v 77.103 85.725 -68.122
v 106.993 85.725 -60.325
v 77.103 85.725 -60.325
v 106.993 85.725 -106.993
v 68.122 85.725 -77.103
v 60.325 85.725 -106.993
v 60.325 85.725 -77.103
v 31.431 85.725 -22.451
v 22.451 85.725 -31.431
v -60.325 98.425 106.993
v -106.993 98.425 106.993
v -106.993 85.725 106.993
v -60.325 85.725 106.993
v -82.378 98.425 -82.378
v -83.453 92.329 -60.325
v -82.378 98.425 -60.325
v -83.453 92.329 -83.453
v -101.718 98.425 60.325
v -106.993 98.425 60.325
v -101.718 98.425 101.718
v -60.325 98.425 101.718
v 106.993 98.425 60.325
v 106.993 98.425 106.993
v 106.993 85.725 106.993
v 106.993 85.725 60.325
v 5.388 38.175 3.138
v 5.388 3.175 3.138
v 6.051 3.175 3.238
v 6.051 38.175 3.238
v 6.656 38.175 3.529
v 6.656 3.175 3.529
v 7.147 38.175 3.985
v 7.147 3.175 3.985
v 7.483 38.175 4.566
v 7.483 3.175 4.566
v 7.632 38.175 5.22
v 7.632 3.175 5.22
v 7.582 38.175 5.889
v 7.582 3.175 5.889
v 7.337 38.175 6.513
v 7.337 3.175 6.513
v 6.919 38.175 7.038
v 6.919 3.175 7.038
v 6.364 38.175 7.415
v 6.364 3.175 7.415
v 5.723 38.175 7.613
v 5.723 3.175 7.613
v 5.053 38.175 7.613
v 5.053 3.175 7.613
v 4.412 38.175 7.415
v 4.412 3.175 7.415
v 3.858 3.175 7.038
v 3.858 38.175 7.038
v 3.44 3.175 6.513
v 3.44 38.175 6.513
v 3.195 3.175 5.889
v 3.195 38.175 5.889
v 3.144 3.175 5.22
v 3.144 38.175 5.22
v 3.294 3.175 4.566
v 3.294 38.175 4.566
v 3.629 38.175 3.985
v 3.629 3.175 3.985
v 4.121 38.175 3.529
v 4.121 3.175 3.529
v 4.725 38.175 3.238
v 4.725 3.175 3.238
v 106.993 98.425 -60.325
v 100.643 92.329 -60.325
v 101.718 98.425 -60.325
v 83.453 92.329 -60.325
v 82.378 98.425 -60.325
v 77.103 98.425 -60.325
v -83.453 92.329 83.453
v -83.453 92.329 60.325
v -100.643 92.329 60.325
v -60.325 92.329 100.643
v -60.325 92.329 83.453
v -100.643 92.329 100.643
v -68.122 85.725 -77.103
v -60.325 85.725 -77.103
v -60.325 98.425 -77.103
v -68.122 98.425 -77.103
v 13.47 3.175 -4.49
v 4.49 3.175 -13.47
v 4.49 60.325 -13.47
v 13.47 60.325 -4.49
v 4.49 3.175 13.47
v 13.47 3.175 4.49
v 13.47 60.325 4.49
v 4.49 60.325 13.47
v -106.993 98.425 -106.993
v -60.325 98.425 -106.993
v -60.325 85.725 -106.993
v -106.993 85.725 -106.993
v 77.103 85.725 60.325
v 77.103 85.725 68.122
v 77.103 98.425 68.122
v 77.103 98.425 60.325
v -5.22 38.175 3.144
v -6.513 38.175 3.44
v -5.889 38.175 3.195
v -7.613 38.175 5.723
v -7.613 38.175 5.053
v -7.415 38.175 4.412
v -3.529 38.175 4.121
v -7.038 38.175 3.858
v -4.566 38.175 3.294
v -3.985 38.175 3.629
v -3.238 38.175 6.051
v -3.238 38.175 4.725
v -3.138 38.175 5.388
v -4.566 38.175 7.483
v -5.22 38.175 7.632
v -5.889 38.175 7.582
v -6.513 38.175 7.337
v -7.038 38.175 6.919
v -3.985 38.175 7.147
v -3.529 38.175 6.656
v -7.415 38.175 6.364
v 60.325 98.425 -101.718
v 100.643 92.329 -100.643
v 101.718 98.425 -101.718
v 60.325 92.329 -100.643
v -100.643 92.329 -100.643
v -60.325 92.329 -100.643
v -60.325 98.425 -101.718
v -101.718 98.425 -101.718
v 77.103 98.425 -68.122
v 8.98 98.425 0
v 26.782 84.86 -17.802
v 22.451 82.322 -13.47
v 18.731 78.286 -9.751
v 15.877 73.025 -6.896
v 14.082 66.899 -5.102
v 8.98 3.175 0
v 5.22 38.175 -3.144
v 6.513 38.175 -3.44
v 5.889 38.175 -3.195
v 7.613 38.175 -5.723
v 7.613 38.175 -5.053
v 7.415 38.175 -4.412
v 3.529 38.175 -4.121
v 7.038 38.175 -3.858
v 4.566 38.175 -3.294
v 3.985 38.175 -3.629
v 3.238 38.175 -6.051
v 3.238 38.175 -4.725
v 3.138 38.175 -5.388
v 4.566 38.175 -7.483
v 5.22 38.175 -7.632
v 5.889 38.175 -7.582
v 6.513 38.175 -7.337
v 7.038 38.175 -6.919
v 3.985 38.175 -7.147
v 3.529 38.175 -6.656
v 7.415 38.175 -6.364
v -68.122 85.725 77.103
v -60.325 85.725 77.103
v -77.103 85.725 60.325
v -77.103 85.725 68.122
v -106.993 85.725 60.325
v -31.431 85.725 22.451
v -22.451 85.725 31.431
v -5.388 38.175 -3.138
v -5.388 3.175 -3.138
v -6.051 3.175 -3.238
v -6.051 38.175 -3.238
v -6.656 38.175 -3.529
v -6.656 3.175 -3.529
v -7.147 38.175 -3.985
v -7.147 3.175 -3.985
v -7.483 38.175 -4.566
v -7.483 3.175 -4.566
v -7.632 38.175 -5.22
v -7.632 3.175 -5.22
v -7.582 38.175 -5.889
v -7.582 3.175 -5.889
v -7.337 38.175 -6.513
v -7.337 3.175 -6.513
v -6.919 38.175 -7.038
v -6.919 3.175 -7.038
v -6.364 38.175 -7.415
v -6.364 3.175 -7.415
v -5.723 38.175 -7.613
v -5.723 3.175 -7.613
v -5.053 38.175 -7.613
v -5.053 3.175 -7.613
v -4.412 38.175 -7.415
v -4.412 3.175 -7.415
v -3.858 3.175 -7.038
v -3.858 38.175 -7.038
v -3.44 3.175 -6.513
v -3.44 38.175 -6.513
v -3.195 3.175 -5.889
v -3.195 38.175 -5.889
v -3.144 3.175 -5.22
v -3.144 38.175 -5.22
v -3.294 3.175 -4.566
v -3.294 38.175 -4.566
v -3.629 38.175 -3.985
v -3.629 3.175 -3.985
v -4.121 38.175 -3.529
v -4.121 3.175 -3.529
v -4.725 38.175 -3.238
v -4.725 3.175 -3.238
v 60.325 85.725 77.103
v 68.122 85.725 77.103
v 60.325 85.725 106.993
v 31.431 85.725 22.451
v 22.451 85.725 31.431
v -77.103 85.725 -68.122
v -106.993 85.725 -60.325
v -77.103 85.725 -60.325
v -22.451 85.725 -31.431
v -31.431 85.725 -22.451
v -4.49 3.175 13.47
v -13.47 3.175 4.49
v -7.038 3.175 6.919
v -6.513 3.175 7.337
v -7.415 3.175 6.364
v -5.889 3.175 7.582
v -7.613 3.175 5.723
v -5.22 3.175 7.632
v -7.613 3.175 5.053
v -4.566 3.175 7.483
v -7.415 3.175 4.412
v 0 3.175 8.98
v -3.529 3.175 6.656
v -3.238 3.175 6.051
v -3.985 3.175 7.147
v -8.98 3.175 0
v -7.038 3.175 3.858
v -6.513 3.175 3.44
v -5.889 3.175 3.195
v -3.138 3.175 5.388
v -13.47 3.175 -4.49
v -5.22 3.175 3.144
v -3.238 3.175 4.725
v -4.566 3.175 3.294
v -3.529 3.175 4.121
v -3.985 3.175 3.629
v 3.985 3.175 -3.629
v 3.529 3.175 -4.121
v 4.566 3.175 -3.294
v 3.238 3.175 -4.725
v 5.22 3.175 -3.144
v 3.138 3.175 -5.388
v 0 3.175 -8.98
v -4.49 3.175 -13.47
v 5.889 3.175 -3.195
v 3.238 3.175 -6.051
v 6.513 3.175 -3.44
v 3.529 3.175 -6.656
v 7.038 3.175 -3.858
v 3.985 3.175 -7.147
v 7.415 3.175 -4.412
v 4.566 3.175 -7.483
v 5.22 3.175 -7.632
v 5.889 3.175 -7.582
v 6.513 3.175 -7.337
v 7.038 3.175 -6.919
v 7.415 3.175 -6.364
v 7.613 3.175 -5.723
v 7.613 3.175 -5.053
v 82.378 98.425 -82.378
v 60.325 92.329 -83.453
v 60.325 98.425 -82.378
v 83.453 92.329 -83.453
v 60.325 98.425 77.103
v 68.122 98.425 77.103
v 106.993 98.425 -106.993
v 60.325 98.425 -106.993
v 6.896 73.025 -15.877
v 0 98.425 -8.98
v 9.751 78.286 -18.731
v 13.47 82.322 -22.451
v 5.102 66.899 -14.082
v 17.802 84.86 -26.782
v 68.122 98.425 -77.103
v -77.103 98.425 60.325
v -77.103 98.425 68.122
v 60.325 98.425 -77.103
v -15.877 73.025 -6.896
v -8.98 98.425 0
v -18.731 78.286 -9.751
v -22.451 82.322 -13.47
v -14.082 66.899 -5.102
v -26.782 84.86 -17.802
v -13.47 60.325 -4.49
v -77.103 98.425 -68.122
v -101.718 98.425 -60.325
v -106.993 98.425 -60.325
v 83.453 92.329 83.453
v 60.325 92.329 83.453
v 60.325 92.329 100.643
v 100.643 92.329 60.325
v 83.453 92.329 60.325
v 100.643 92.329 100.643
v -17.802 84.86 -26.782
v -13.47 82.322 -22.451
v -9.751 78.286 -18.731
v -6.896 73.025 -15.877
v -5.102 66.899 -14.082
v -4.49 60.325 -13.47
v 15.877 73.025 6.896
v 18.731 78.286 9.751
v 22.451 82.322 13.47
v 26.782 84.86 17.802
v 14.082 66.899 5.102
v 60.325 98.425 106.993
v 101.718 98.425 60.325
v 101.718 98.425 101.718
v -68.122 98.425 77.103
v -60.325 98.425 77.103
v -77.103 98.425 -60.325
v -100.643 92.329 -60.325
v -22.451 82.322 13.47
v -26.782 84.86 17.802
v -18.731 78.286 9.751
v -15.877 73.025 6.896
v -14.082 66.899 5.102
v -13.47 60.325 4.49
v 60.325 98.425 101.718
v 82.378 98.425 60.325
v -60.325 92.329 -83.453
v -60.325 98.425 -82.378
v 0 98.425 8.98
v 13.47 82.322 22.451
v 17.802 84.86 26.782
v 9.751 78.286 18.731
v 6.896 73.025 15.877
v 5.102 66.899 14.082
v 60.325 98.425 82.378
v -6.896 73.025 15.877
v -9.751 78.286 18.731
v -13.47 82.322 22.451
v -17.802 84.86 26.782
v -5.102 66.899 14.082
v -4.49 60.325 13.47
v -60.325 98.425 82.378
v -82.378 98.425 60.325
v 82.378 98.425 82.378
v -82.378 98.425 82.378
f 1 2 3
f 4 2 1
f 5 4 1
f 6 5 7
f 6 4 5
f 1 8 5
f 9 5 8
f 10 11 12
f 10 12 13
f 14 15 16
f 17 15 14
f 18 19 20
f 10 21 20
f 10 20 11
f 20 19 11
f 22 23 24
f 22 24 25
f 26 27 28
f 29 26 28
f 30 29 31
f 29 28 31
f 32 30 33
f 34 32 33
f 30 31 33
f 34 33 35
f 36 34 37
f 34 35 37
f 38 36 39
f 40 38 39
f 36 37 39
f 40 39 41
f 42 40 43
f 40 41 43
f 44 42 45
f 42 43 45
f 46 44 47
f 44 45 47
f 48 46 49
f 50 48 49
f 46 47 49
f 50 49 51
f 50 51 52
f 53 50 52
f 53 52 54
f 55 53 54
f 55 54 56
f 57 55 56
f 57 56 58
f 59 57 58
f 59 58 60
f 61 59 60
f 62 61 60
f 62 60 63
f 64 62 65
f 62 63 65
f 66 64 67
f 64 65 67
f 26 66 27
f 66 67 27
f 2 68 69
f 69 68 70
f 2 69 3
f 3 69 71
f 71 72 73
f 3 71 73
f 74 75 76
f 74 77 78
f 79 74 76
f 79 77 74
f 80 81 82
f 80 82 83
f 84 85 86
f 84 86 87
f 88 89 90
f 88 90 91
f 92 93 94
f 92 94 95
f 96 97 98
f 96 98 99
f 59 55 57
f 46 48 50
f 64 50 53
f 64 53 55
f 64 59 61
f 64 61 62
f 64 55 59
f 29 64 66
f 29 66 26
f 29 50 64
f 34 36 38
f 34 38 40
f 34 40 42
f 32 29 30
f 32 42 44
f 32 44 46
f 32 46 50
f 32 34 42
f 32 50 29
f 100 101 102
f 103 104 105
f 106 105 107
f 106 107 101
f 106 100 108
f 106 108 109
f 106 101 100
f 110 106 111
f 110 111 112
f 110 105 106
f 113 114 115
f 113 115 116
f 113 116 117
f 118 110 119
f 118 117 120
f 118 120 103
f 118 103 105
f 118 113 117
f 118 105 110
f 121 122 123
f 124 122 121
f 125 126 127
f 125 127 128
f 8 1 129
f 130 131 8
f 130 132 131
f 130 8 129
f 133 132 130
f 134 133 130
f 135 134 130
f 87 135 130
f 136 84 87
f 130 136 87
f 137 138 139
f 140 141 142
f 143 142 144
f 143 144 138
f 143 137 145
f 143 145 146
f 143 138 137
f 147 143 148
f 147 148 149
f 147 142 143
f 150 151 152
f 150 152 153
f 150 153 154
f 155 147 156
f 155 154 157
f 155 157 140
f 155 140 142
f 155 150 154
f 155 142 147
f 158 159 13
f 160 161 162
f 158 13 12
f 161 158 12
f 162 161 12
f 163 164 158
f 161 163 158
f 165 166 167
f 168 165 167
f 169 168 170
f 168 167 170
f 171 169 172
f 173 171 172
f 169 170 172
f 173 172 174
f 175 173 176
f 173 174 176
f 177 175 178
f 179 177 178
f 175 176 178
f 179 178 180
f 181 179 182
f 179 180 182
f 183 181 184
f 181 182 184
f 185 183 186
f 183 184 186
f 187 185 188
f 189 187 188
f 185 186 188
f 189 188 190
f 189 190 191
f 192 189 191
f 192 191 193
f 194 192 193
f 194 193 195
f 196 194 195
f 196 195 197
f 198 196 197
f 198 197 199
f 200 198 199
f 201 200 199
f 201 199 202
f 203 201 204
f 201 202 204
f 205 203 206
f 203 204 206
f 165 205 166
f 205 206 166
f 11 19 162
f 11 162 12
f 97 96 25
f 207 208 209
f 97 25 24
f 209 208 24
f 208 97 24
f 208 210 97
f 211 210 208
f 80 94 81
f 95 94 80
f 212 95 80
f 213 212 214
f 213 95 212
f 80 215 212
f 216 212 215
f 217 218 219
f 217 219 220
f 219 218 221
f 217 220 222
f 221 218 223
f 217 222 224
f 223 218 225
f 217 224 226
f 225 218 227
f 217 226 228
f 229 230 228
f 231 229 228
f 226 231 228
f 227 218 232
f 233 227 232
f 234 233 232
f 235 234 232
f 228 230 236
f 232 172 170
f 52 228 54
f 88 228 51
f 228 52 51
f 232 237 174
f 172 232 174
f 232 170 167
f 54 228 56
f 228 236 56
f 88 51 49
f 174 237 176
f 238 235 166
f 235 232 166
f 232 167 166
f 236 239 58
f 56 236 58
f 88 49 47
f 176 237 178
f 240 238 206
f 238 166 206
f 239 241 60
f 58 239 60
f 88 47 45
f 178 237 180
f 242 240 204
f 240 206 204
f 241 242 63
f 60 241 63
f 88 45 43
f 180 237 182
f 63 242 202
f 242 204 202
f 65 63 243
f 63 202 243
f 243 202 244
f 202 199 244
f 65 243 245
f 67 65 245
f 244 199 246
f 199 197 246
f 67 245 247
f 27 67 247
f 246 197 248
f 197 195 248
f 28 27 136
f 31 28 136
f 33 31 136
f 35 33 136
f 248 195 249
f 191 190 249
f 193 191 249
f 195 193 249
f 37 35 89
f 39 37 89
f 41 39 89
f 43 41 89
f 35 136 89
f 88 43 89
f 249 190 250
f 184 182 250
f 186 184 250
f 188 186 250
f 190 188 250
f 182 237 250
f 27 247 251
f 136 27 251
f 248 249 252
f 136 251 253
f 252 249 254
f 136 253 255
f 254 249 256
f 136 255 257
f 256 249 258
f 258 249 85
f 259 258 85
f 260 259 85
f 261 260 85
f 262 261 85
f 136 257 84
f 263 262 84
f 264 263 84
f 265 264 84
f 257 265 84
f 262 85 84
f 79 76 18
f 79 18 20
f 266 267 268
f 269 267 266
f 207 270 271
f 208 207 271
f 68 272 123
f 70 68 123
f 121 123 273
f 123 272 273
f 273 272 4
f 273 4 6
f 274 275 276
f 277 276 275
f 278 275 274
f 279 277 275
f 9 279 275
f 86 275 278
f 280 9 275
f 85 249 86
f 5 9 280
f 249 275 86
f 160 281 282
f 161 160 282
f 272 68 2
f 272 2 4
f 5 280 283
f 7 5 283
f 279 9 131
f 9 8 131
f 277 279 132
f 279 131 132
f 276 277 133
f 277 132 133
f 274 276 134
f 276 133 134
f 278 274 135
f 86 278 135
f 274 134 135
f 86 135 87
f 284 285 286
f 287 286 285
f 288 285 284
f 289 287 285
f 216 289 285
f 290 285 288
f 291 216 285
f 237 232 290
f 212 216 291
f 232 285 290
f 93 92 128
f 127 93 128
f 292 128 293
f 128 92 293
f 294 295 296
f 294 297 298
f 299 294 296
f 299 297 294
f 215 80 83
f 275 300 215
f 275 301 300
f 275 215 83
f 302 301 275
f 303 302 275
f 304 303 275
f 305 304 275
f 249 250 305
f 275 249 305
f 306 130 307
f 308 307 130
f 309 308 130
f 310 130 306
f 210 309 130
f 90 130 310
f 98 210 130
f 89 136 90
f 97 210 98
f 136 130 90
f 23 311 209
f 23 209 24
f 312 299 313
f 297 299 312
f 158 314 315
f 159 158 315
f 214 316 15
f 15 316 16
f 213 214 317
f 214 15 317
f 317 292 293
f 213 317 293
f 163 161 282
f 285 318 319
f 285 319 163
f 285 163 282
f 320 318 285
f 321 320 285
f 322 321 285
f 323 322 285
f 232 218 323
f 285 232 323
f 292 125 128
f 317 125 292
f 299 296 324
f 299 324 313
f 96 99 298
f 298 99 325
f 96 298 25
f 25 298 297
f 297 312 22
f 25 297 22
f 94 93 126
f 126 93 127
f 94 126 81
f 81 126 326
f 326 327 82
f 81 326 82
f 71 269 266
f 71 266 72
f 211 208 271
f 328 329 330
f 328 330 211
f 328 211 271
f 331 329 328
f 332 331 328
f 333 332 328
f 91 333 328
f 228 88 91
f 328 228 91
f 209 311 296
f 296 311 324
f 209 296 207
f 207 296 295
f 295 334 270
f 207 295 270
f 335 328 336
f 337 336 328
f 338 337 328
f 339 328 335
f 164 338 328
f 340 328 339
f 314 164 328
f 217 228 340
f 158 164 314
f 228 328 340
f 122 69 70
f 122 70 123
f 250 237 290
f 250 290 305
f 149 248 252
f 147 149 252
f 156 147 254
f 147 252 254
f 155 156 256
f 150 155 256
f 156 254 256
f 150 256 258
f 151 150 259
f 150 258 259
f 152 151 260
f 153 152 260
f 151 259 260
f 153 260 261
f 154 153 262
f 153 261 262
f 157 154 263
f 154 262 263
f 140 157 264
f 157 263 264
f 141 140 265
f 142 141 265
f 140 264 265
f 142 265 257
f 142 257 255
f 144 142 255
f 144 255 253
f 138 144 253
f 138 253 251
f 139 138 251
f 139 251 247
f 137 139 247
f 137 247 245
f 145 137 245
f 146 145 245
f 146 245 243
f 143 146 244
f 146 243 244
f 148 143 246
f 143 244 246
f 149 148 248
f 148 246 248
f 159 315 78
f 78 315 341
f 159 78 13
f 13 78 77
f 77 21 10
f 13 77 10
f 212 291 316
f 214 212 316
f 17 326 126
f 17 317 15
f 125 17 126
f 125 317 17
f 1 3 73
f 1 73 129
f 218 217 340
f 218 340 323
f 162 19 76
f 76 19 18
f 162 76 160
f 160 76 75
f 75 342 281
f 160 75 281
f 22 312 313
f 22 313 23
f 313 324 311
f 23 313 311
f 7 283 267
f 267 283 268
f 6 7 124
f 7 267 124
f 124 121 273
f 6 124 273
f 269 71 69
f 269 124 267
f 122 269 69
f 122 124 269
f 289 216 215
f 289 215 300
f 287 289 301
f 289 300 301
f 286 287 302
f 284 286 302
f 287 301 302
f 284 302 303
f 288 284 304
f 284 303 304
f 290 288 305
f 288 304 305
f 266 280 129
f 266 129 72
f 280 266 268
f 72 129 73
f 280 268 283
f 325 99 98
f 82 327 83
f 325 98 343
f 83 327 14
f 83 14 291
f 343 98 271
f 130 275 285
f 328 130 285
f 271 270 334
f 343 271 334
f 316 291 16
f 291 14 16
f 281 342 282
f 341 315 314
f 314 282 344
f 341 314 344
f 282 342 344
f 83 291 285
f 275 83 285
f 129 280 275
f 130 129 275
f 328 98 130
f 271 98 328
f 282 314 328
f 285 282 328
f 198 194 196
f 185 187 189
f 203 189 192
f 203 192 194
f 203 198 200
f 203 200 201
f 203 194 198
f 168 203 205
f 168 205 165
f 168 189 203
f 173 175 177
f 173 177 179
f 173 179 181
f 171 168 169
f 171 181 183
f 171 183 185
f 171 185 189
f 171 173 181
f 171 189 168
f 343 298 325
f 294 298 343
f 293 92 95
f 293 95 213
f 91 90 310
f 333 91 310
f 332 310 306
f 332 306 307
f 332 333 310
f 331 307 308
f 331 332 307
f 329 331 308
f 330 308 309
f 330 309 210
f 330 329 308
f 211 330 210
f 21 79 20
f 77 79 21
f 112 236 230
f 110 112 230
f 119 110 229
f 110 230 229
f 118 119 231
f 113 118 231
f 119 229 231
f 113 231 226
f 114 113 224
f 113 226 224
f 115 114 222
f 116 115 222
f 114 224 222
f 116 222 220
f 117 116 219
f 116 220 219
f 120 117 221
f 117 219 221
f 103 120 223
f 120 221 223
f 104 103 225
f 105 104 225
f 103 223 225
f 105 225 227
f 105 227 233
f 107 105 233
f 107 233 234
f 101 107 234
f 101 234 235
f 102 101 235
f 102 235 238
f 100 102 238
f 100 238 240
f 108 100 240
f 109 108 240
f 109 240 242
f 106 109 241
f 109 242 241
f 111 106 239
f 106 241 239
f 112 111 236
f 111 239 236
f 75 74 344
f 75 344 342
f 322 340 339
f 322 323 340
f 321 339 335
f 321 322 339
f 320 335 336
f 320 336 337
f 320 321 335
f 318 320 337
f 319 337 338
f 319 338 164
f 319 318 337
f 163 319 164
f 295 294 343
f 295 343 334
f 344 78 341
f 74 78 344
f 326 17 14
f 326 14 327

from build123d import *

# Parameters (mm, degrees)
SKETCH5_R                = 154.617689271
BOSS_EXTRUDE4_DEPTH      = 3.175
BOSS_EXTRUDE9_DEPTH      = 95.25
CUT_EXTRUDE1_START       = -95.25
CUT_EXTRUDE1_DEPTH       = 82.55
BOSS_EXTRUDE10_DEPTH     = 12.7
CUT_EXTRUDE11_DEPTH      = 6.096
CUT_EXTRUDE11_DRAFT      = -10
FILLET2_R                = 25.4
CIRPATTERN7_COUNT        = 4
CIRPATTERN7_COPY_1_DEPTH = 6.096
CIRPATTERN7_COPY_1_DRAFT = -10
CIRPATTERN7_COPY_2_DEPTH = 6.096
CIRPATTERN7_COPY_2_DRAFT = -10
CIRPATTERN7_COPY_3_DEPTH = 6.096
CIRPATTERN7_COPY_3_DRAFT = -10
FILLET2_OF_CIRPATTERN7_R = 25.4
SKETCH26_R               = 154.617689271
CUT_EXTRUDE9_DEPTH       = 6.35
SKETCH27_R               = 2.249999945
CUT_EXTRUDE12_DEPTH      = 35.000000104
CIRPATTERN8_COUNT        = 4


# Read off the part's stored shape, not the designer's step: Cut-Extrude11
with BuildPart() as part:
    # Sketch5 → Boss-Extrude4 (new, symmetric)
    with BuildSketch(Plane(origin=(0, 0, 0), x_dir=(1, 0, 0), z_dir=(0, 1, 0))):
        with Locations(Location((0, 0, 0), (0, 0, 270))):
            Circle(SKETCH5_R)
    extrude(amount=BOSS_EXTRUDE4_DEPTH, both=True)

    # Sketch15 → Boss-Extrude9 (add)
    with BuildSketch(Plane(origin=(0, 3.175, 0), x_dir=(1, 0, 0), z_dir=(0, 1, 0))):
        Polygon((0, 8.980256121), (94.292689271, 103.272945392), (103.272945392, 94.292689271), (8.980256121, 0), (0, 0), align=None)
    boss_extrude9 = extrude(amount=BOSS_EXTRUDE9_DEPTH)

    # Sketch17 → Cut-Extrude1 (cut)
    with BuildSketch(Plane(origin=(0, 98.425, 0), x_dir=(1, 0, 0), z_dir=(0, 1, 0)).offset(CUT_EXTRUDE1_START)):
        Polygon((13.470384182, 4.490128061), (119.126854284, 110.146598163), (110.146598163, 119.126854284), (4.490128061, 13.470384182), align=None)
    cut_extrude1 = extrude(amount=CUT_EXTRUDE1_DEPTH, mode=Mode.SUBTRACT)

    # Sketch19 → Boss-Extrude10 (add)
    with BuildSketch(Plane(origin=(0, 98.425, 0), x_dir=(1, 0, 0), z_dir=(0, 1, 0))):
        Polygon((60.325, 106.992689271), (81.592689271, 106.992689271), (106.992689271, 106.992689271), (106.992689271, 81.592689271), (106.992689271, 60.325), (77.102561211, 60.325), (77.102561211, 77.102561211), (60.325, 77.102561211), align=None)
    boss_extrude10 = extrude(amount=-BOSS_EXTRUDE10_DEPTH)


with BuildPart() as cut_extrude11_tool:
    # Cut-Extrude11 outline → Cut-Extrude11 (with draft: the straight prism first)
    with BuildSketch(Plane(origin=(0, 92.329, 0), x_dir=(1, 0, 0), z_dir=(0, 1, 0))):
        Polygon((83.452561211, 60.325), (100.642689271, 60.325), (100.642689271, 100.642689271), (60.325, 100.642689271), (60.325, 83.452561211), (83.452561211, 83.452561211), align=None)
    extrude(amount=CUT_EXTRUDE11_DEPTH)
    # Cut-Extrude11: the draft: its side faces are tilted about the plane it starts from
    cut_extrude11_sides = [cut_extrude11_tool.faces().sort_by_distance(p)[0] for p in [
        (92.047625241, 95.377, -60.325),
        (100.642689271, 95.377, -80.483844636),
        (80.483844635, 95.377, -100.642689271),
        (60.325, 95.377, -92.047625241),
        (71.888780606, 95.377, -83.452561211),
        (83.452561211, 95.377, -71.888780606),
    ]]
    draft(cut_extrude11_sides, Plane(origin=(0, 92.329, 0), x_dir=(1, 0, 0), z_dir=(0, 1, 0)), CUT_EXTRUDE11_DRAFT)


with BuildPart() as part_1:
    add(part.part)

    # Cut-Extrude11: cut by cut_extrude11_tool
    add(cut_extrude11_tool.part, mode=Mode.SUBTRACT)

    # Fillet2
    fillet2_edges = [part_1.edges().sort_by_distance(p)[0] for p in [
        (8.980256121, 85.725, -8.980256121),
    ]]
    fillet(fillet2_edges, radius=FILLET2_R)

    # CirPattern7: Boss-Extrude9, Cut-Extrude1, Boss-Extrude10 ×4 about axis
    cirpattern7_axis = Axis((0, 0, 0), (0, 1, 0))
    add([boss_extrude9.rotate(cirpattern7_axis, i * 360 / CIRPATTERN7_COUNT) for i in range(1, CIRPATTERN7_COUNT)])
    add([cut_extrude1.rotate(cirpattern7_axis, i * 360 / CIRPATTERN7_COUNT) for i in range(1, CIRPATTERN7_COUNT)], mode=Mode.SUBTRACT)
    add([boss_extrude10.rotate(cirpattern7_axis, i * 360 / CIRPATTERN7_COUNT) for i in range(1, CIRPATTERN7_COUNT)])


with BuildPart() as cirpattern7_copy_1_tool:
    # CirPattern7 copy 1 sketch → CirPattern7 copy 1 (with draft: the straight prism first)
    with BuildSketch(Plane(origin=(0, 92.329, 0), x_dir=(0, 0, -1), z_dir=(0, 1, 0))):
        Polygon((83.452561211, 60.325), (100.642689271, 60.325), (100.642689271, 100.642689271), (60.325, 100.642689271), (60.325, 83.452561211), (83.452561211, 83.452561211), align=None)
    extrude(amount=CIRPATTERN7_COPY_1_DEPTH)
    # CirPattern7 copy 1: the draft: its side faces are tilted about the plane it starts from
    cirpattern7_copy_1_sides = [cirpattern7_copy_1_tool.faces().sort_by_distance(p)[0] for p in [
        (-60.325, 95.377, -92.047625241),
        (-80.483844636, 95.377, -100.642689271),
        (-100.642689271, 95.377, -80.483844635),
        (-92.047625241, 95.377, -60.325),
        (-83.452561211, 95.377, -71.888780606),
        (-71.888780606, 95.377, -83.452561211),
    ]]
    draft(cirpattern7_copy_1_sides, Plane(origin=(0, 92.329, 0), x_dir=(0, 0, -1), z_dir=(0, 1, 0)), CIRPATTERN7_COPY_1_DRAFT)


with BuildPart() as part_2:
    add(part_1.part)

    # CirPattern7 copy 1: cut by cirpattern7_copy_1_tool
    add(cirpattern7_copy_1_tool.part, mode=Mode.SUBTRACT)


with BuildPart() as cirpattern7_copy_2_tool:
    # CirPattern7 copy 2 sketch → CirPattern7 copy 2 (with draft: the straight prism first)
    with BuildSketch(Plane(origin=(0, 92.329, 0), x_dir=(-1, 0, 0), z_dir=(0, 1, 0))):
        Polygon((83.452561211, 60.325), (100.642689271, 60.325), (100.642689271, 100.642689271), (60.325, 100.642689271), (60.325, 83.452561211), (83.452561211, 83.452561211), align=None)
    extrude(amount=CIRPATTERN7_COPY_2_DEPTH)
    # CirPattern7 copy 2: the draft: its side faces are tilted about the plane it starts from
    cirpattern7_copy_2_sides = [cirpattern7_copy_2_tool.faces().sort_by_distance(p)[0] for p in [
        (-92.047625241, 95.377, 60.325),
        (-100.642689271, 95.377, 80.483844636),
        (-80.483844635, 95.377, 100.642689271),
        (-60.325, 95.377, 92.047625241),
        (-71.888780606, 95.377, 83.452561211),
        (-83.452561211, 95.377, 71.888780606),
    ]]
    draft(cirpattern7_copy_2_sides, Plane(origin=(0, 92.329, 0), x_dir=(-1, 0, 0), z_dir=(0, 1, 0)), CIRPATTERN7_COPY_2_DRAFT)


with BuildPart() as part_3:
    add(part_2.part)

    # CirPattern7 copy 2: cut by cirpattern7_copy_2_tool
    add(cirpattern7_copy_2_tool.part, mode=Mode.SUBTRACT)


with BuildPart() as cirpattern7_copy_3_tool:
    # CirPattern7 copy 3 sketch → CirPattern7 copy 3 (with draft: the straight prism first)
    with BuildSketch(Plane.ZX.offset(92.329)):
        Polygon((83.452561211, 60.325), (100.642689271, 60.325), (100.642689271, 100.642689271), (60.325, 100.642689271), (60.325, 83.452561211), (83.452561211, 83.452561211), align=None)
    extrude(amount=CIRPATTERN7_COPY_3_DEPTH)
    # CirPattern7 copy 3: the draft: its side faces are tilted about the plane it starts from
    cirpattern7_copy_3_sides = [cirpattern7_copy_3_tool.faces().sort_by_distance(p)[0] for p in [
        (60.325, 95.377, 92.047625241),
        (80.483844636, 95.377, 100.642689271),
        (100.642689271, 95.377, 80.483844635),
        (92.047625241, 95.377, 60.325),
        (83.452561211, 95.377, 71.888780606),
        (71.888780606, 95.377, 83.452561211),
    ]]
    draft(cirpattern7_copy_3_sides, Plane.ZX.offset(92.329), CIRPATTERN7_COPY_3_DRAFT)


with BuildPart() as part_4:
    add(part_3.part)

    # CirPattern7 copy 3: cut by cirpattern7_copy_3_tool
    add(cirpattern7_copy_3_tool.part, mode=Mode.SUBTRACT)

    # Fillet2 of CirPattern7
    fillet2_of_cirpattern7_edges = [part_4.edges().sort_by_distance(p)[0] for p in [
        (-8.980256121, 85.725, -8.980256121),
        (-8.980256121, 85.725, 8.980256121),
        (8.980256121, 85.725, 8.980256121),
    ]]
    fillet(fillet2_of_cirpattern7_edges, radius=FILLET2_OF_CIRPATTERN7_R)

    # Sketch26 → Cut-Extrude9 (cut)
    with BuildSketch(Plane(origin=(0, 3.175, 0), x_dir=(1, 0, 0), z_dir=(0, 1, 0))):
        Circle(SKETCH26_R)
    extrude(amount=-CUT_EXTRUDE9_DEPTH, mode=Mode.SUBTRACT)

    # Sketch27 → Cut-Extrude12 (cut)
    with BuildSketch(Plane.XZ.offset(-3.175)):
        with Locations(Location((5.388153673, 5.388153673, 0), (0, 0, 270))):
            Circle(SKETCH27_R)
    cut_extrude12 = extrude(amount=-CUT_EXTRUDE12_DEPTH, mode=Mode.SUBTRACT)

    # CirPattern8: Cut-Extrude12 ×4 about axis
    cirpattern8_axis = Axis((0, 0, 0), (0, 1, 0))
    for i in range(1, CIRPATTERN8_COUNT):
        add(cut_extrude12.rotate(cirpattern8_axis, i * 360 / CIRPATTERN8_COUNT), mode=Mode.SUBTRACT)


solid = part_4.part
